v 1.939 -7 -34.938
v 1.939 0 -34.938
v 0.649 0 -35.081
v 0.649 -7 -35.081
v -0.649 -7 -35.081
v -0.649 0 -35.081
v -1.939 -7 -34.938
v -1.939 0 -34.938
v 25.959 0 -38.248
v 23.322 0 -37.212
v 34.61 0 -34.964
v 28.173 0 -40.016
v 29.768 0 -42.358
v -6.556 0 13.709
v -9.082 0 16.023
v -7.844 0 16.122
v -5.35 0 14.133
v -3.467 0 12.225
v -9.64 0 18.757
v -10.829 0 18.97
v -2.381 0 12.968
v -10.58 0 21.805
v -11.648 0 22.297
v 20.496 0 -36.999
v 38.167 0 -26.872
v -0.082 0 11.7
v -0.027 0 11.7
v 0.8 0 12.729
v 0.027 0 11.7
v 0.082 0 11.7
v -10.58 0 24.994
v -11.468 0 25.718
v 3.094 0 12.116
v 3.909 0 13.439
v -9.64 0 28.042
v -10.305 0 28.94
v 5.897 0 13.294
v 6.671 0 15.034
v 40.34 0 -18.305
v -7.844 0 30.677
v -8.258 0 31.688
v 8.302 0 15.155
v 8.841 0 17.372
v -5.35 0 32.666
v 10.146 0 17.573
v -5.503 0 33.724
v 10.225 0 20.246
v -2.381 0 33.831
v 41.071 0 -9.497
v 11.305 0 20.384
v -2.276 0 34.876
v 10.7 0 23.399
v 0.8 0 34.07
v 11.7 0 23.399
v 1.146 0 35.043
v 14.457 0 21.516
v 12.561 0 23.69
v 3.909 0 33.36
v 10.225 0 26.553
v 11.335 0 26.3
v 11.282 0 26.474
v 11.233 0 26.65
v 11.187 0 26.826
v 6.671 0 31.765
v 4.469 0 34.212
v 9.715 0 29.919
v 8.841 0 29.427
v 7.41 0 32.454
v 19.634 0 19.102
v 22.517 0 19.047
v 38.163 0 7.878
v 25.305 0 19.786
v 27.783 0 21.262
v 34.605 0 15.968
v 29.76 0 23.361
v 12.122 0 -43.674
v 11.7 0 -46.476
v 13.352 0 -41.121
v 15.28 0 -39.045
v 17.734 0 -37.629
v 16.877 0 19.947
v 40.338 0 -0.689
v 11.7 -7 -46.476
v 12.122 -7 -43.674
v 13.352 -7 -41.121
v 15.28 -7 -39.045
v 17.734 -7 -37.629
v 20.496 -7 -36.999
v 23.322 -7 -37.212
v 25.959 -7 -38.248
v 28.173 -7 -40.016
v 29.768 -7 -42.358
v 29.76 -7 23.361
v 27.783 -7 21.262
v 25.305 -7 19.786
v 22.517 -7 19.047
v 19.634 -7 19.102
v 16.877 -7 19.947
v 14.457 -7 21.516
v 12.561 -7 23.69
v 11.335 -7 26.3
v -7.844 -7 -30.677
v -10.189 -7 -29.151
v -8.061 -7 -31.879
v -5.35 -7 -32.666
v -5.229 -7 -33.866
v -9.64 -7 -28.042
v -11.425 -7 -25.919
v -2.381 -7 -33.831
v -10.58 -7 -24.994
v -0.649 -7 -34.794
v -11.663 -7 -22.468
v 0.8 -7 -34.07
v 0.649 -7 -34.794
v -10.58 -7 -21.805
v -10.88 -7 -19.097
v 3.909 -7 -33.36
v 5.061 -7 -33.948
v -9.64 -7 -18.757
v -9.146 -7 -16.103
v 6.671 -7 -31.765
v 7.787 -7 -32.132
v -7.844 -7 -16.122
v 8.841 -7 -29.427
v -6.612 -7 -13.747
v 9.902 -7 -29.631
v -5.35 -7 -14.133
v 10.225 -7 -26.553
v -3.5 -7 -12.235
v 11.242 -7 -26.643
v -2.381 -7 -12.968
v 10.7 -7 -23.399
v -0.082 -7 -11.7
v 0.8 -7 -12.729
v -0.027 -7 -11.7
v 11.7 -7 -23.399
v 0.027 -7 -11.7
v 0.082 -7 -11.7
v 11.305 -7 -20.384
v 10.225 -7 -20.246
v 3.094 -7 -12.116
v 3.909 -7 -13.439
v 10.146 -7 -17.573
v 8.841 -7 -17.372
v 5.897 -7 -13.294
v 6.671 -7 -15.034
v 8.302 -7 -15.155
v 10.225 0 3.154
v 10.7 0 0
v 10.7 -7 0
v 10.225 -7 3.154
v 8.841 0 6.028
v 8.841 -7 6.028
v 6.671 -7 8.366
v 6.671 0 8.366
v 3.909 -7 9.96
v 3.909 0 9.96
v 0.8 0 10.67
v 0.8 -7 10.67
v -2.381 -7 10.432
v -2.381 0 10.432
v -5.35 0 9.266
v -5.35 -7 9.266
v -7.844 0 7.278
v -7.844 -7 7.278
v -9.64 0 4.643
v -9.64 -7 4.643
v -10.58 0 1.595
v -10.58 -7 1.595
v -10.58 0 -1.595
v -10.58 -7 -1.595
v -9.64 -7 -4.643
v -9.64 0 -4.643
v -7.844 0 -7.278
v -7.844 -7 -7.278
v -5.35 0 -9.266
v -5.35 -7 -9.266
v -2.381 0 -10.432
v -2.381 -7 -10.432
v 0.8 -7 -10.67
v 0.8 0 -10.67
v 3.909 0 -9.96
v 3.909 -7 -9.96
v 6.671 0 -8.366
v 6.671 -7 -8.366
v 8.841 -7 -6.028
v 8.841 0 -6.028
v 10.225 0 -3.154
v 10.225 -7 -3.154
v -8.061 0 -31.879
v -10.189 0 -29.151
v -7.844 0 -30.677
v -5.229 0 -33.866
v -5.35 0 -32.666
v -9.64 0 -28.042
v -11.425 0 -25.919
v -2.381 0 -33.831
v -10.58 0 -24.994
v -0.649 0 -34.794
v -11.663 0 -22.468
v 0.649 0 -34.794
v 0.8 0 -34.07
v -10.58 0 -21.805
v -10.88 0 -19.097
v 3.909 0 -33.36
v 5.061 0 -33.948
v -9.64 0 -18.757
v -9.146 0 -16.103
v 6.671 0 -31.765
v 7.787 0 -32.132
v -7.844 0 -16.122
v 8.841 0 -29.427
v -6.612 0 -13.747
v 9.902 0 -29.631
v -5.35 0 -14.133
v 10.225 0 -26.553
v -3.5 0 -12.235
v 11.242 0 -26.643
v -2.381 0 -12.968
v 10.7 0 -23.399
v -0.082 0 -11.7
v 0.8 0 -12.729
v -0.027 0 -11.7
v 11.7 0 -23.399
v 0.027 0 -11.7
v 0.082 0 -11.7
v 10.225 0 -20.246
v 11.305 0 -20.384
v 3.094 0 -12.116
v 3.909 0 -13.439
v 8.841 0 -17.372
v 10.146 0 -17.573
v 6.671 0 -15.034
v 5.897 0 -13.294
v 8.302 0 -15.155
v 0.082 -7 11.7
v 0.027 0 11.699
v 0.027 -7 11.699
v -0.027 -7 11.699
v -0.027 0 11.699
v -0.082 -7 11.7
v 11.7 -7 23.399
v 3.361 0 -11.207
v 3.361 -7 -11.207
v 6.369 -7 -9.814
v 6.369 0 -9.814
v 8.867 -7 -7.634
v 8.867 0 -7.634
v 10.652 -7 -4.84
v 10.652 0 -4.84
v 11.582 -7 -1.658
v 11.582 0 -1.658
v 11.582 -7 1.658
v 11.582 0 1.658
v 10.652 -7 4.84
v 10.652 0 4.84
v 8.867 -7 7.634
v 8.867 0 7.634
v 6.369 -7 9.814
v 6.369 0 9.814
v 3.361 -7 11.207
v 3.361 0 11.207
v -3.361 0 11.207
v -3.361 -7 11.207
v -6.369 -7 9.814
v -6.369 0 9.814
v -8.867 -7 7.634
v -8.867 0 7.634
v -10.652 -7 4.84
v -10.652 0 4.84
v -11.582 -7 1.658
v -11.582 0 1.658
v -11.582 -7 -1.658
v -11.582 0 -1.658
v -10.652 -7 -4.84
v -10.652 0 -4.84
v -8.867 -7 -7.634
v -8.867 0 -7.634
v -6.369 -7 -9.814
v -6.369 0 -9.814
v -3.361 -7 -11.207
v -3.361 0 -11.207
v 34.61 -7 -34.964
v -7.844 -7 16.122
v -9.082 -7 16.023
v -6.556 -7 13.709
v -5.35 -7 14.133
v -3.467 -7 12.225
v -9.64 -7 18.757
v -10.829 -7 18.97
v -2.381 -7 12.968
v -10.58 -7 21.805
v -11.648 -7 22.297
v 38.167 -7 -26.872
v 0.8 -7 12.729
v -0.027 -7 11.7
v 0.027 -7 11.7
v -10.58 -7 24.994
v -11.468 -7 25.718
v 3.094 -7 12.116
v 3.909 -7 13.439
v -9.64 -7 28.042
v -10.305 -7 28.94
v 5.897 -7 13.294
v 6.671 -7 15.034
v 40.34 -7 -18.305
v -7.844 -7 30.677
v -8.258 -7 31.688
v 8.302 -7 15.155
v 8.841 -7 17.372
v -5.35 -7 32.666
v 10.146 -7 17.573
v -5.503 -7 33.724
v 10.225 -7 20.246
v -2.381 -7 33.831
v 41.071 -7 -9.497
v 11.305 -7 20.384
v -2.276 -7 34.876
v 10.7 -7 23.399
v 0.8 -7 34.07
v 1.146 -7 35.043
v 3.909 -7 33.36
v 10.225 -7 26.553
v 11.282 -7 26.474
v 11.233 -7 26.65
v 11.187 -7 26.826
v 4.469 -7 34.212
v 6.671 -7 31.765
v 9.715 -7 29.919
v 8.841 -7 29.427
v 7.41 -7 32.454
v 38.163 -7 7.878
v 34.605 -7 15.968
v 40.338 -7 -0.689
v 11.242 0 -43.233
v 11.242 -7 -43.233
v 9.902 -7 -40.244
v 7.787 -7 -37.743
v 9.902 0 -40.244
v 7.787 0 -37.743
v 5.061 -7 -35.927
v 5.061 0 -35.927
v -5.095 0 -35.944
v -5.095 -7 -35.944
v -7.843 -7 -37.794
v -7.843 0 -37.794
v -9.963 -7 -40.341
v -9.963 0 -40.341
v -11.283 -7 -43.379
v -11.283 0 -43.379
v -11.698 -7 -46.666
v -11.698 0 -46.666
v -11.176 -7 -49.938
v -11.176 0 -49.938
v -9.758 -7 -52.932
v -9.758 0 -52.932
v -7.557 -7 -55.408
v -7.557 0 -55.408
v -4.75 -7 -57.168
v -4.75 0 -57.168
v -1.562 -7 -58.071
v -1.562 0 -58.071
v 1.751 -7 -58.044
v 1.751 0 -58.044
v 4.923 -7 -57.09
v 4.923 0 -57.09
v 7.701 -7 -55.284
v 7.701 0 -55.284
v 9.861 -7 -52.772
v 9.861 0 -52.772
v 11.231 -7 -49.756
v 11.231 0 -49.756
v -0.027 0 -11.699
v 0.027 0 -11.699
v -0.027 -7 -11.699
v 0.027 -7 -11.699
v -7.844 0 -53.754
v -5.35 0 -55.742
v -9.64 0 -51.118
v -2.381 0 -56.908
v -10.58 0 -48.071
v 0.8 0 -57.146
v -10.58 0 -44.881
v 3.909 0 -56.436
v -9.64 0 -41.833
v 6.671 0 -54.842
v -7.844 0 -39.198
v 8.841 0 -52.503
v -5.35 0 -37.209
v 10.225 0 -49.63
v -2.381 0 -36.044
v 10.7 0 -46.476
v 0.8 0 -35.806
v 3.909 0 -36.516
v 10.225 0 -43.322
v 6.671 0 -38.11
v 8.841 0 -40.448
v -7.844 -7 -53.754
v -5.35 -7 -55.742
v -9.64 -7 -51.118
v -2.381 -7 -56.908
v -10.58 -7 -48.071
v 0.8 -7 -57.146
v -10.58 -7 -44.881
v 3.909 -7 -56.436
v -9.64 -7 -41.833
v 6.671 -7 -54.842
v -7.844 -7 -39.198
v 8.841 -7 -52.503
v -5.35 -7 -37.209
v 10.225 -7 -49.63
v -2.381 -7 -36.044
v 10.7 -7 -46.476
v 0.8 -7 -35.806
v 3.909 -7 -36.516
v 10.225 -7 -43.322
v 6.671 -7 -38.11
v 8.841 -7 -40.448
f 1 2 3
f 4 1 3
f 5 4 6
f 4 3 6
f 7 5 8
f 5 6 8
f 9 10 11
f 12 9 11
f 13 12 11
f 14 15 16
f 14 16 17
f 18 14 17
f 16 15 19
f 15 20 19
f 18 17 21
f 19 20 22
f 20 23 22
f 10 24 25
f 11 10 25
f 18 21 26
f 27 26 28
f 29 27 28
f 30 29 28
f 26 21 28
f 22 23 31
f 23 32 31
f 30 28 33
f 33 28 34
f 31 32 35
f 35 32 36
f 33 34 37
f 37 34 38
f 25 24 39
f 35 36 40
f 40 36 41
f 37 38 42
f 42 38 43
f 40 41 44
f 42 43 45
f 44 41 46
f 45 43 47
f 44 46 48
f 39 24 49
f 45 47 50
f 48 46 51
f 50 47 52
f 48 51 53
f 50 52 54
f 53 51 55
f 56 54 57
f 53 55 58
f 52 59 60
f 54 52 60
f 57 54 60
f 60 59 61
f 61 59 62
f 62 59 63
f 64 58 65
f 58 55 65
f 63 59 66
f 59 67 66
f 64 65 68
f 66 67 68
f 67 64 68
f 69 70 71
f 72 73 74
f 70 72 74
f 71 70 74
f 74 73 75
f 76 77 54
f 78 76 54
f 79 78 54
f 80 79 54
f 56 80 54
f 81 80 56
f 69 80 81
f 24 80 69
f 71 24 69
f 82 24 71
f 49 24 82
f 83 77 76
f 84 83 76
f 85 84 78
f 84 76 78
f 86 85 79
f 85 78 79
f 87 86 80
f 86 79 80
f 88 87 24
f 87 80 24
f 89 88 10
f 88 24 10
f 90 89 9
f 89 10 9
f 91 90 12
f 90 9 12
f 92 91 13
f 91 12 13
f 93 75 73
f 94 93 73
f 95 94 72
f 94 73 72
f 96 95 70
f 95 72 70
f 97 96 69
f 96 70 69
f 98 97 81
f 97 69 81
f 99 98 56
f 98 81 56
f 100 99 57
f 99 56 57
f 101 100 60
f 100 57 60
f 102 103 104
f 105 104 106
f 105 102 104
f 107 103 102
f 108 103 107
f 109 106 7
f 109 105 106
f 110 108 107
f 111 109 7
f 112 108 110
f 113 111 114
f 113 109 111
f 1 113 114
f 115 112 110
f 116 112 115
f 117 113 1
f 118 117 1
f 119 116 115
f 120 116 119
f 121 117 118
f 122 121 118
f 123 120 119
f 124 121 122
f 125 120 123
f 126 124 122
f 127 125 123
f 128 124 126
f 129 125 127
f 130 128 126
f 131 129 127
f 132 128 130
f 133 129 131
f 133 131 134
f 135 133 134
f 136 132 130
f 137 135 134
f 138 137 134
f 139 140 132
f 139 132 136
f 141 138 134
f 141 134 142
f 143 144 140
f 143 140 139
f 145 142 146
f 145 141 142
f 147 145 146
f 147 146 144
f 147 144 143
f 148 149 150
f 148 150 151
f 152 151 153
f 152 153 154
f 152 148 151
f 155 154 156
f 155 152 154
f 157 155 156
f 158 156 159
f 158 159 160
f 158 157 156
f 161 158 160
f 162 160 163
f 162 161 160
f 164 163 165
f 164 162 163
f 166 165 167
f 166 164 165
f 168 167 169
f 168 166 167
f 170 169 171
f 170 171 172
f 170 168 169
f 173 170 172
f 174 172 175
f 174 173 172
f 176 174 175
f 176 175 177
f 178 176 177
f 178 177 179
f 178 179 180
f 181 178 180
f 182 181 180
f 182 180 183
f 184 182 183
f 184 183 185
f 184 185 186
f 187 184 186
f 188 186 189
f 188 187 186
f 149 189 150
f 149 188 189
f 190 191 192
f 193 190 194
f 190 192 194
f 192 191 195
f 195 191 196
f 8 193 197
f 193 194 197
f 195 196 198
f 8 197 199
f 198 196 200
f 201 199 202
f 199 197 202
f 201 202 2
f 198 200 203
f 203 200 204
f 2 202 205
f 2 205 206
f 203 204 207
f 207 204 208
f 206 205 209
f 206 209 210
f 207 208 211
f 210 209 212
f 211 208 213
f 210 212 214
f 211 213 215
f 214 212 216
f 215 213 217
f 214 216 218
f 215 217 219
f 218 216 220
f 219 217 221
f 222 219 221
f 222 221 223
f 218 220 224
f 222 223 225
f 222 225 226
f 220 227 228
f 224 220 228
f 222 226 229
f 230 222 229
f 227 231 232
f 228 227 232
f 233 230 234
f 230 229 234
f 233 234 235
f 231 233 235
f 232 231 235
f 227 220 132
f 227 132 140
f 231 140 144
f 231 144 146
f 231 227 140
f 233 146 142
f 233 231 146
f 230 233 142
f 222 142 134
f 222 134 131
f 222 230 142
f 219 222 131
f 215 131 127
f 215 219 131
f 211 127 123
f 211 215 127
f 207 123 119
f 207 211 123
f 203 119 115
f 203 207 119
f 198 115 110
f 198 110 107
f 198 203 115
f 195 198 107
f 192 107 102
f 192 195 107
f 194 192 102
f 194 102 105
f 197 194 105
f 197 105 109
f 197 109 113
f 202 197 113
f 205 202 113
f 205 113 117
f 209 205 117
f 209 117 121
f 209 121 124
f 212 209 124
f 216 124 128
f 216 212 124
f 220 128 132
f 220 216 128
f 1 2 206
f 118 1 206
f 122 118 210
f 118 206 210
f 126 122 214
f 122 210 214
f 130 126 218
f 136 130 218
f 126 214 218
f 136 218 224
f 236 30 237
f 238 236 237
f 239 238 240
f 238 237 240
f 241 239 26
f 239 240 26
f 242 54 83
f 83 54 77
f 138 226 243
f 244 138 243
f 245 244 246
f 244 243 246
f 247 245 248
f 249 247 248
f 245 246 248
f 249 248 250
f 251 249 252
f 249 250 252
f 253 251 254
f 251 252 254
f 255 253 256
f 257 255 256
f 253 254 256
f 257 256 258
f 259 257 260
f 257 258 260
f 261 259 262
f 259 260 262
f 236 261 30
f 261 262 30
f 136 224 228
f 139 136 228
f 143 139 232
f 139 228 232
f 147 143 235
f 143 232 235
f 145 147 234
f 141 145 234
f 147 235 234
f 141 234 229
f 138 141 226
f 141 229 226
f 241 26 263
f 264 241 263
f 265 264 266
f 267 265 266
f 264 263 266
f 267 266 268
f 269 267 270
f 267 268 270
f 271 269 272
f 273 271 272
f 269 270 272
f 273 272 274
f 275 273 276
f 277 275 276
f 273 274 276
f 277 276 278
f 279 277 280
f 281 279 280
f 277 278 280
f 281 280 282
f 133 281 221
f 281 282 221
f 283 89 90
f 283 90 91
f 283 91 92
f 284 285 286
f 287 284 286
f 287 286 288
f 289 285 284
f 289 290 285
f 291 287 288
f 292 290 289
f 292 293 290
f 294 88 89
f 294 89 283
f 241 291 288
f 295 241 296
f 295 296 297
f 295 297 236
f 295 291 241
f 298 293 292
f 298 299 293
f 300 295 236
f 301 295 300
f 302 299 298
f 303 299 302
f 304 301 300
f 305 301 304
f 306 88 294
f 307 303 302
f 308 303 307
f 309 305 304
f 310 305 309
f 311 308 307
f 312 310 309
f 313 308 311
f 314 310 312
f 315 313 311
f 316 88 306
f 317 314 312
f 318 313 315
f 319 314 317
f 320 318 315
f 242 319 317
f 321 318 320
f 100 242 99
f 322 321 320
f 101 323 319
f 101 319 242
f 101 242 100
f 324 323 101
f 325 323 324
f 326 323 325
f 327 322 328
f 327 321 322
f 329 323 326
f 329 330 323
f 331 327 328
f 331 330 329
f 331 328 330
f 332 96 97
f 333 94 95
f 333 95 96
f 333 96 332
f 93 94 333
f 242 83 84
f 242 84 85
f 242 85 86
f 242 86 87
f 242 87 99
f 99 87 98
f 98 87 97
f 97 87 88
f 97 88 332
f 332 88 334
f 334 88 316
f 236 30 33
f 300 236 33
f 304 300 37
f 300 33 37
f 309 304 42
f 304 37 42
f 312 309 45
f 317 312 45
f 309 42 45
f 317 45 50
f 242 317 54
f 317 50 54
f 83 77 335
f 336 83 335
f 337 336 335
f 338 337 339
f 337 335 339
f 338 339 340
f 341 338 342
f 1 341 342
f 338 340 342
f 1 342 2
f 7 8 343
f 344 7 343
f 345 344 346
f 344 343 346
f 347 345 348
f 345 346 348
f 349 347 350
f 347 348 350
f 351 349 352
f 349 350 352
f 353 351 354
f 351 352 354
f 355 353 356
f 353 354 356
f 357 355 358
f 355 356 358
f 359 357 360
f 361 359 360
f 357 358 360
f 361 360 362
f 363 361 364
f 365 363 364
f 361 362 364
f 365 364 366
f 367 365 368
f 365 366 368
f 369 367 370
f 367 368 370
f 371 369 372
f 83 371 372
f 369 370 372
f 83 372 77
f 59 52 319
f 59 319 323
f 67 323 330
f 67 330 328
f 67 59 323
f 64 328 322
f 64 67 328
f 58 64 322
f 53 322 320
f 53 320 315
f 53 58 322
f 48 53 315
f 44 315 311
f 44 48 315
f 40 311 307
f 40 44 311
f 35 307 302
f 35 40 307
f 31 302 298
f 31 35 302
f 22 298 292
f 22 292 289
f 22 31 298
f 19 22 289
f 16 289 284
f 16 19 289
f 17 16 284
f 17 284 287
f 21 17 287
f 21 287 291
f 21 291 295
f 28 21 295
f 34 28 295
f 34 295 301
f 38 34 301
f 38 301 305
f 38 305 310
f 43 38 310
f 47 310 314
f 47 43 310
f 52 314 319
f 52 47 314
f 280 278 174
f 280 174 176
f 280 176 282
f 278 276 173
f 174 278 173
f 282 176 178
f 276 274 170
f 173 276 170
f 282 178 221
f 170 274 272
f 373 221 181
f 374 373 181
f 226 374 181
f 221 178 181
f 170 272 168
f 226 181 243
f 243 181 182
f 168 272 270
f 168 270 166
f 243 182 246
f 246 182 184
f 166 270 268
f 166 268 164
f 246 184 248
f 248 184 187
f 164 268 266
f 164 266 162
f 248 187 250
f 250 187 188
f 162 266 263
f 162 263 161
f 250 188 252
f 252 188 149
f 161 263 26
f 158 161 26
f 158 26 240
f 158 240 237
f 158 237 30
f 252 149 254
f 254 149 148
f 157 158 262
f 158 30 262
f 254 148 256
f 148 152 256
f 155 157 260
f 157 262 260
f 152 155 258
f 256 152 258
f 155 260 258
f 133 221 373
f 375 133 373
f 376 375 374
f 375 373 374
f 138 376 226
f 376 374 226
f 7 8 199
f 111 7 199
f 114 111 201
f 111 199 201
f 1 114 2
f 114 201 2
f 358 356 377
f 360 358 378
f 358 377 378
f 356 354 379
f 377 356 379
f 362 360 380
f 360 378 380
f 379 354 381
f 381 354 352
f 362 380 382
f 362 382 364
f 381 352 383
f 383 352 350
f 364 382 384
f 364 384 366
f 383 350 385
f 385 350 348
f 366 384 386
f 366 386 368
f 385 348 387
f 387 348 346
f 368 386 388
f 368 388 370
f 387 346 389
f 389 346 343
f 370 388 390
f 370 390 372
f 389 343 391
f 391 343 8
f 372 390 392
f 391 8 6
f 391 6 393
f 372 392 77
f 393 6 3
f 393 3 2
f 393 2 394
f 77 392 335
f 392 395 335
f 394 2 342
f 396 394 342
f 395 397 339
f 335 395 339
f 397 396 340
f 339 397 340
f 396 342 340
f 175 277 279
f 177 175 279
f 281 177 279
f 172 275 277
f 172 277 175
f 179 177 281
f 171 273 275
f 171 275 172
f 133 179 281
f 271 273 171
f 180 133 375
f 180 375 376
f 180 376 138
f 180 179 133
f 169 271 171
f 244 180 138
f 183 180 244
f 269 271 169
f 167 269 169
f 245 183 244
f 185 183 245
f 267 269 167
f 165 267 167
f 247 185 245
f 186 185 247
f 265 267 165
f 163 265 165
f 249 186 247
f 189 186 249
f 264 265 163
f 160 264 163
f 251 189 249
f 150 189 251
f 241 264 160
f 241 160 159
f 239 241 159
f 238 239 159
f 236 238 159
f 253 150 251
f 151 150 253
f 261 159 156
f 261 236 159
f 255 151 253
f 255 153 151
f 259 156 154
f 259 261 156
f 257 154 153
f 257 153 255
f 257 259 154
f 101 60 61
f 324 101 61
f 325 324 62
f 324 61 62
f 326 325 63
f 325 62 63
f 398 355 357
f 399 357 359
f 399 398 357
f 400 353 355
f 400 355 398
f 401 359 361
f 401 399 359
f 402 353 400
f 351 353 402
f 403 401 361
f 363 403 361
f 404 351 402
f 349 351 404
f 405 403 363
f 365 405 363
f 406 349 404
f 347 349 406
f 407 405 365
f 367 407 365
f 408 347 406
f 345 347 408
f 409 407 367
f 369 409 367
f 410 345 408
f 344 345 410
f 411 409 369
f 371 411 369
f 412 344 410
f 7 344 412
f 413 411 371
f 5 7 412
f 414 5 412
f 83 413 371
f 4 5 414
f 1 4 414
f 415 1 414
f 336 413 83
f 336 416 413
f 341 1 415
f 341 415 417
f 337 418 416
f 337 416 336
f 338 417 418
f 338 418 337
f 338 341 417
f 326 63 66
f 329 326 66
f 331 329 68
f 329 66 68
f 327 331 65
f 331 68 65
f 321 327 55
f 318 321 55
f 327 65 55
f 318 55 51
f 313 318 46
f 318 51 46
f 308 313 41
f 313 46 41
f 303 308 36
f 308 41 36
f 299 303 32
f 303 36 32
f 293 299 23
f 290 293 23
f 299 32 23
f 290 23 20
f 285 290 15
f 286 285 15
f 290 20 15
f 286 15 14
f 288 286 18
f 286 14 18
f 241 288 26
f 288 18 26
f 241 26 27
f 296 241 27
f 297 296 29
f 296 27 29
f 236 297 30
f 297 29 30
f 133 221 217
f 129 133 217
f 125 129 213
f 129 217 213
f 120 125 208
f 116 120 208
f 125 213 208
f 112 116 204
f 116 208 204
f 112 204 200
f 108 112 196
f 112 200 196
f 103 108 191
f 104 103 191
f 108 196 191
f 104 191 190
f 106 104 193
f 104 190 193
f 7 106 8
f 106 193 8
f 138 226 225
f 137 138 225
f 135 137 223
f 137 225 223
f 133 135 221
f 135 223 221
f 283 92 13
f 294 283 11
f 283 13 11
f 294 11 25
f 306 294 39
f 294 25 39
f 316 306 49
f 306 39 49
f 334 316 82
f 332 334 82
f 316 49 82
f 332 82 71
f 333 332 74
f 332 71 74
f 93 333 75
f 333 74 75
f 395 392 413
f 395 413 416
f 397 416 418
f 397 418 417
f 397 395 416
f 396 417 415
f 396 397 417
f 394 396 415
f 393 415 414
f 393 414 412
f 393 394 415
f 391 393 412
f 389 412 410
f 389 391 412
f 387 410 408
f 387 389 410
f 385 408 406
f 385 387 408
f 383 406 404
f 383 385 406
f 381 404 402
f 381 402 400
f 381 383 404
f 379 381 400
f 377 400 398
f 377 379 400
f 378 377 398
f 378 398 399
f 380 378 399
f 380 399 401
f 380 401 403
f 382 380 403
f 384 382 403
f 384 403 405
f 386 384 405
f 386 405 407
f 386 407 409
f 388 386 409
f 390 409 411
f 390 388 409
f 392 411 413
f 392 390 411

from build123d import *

# Parameters (mm, degrees)
F0_R     = 10.7
F1_DEPTH = 7


with BuildPart() as f1:
    # F0 (on Front) → F1 (new body)
    with BuildSketch(Plane.XZ):
        with BuildLine():
            ThreePointArc((-0.0819729994, 11.6997128353), (0, 11.7), (0.0819729994, 11.6997128353))
            ThreePointArc((0.0819729994, 11.6997128353), (8.3020805854, 15.1553091045), (11.7, 23.3994256705))
            ThreePointArc((11.7, 23.3994256705), (11.6083373103, 24.8611044625), (11.3347854887, 26.2998804495))
            ThreePointArc((11.3347854887, 26.2998804495), (11.2574671046, 26.5618552508), (11.1870535149, 26.8257697359))
            ThreePointArc((11.1870535149, 26.8257697359), (-9.3824358593, 30.3894111745), (-0.0819729994, 11.6997128353))
        make_face()
        with Locations((0, 23.3994256705)):
            Circle(F0_R, mode=Mode.SUBTRACT)
        with BuildLine():
            Line((11.7, 23.3994256705), (11.7, 0))
            Line((11.7, 0), (11.7, -23.3994256705))
            Line((11.7, -23.3994256705), (11.7, -46.4759171009))
            ThreePointArc((11.7, -46.4759171009), (19.0913360222, -37.2102467747), (29.7679230211, -42.3575747068))
            ThreePointArc((29.7679230211, -42.3575747068), (41.0708012444, -9.4969864297), (29.7604638503, 23.3610352102))
            ThreePointArc((29.7604638503, 23.3610352102), (19.634015707, 19.1024036043), (11.3347854887, 26.2998804495))
            ThreePointArc((11.3347854887, 26.2998804495), (11.6083373103, 24.8611044625), (11.7, 23.3994256705))
        make_face()
    extrude(amount=F1_DEPTH)


with BuildPart() as f1b:
    # F0 (on Front) → F1, piece 2 (new body)
    with BuildSketch(Plane.XZ):
        with BuildLine():
            ThreePointArc((0.0819729994, -11.6997128353), (8.3020805854, -8.244116566), (11.7, 0))
            ThreePointArc((11.7, 0), (8.3020805854, 8.244116566), (0.0819729994, 11.6997128353))
            ThreePointArc((0.0819729994, 11.6997128353), (0, 11.6994256705), (-0.0819729994, 11.6997128353))
            ThreePointArc((-0.0819729994, 11.6997128353), (-11.7, 0), (-0.0819729994, -11.6997128353))
            ThreePointArc((-0.0819729994, -11.6997128353), (0, -11.6994256705), (0.0819729994, -11.6997128353))
        make_face()
        Circle(F0_R, mode=Mode.SUBTRACT)
    extrude(amount=F1_DEPTH)


with BuildPart() as f1c:
    # F0 (on Front) → F1, piece 3 (new body)
    with BuildSketch(Plane.XZ):
        with BuildLine():
            ThreePointArc((11.7, -23.3994256705), (8.3020805854, -15.1553091045), (0.0819729994, -11.6997128353))
            ThreePointArc((0.0819729994, -11.6997128353), (0, -11.7), (-0.0819729994, -11.6997128353))
            ThreePointArc((-0.0819729994, -11.6997128353), (-11.6628274762, -22.467516201), (-1.9387846233, -34.9376713857))
            ThreePointArc((-1.9387846233, -34.9376713857), (0, -34.7759171009), (1.9387846233, -34.9376713857))
            ThreePointArc((1.9387846233, -34.9376713857), (8.932350757, -30.9560856439), (11.7, -23.3994256705))
        make_face()
        with Locations((0, -23.3994256705)):
            Circle(F0_R, mode=Mode.SUBTRACT)
    extrude(amount=F1_DEPTH)


with BuildPart() as f1d:
    # F0 (on Front) → F1, piece 4 (new body)
    with BuildSketch(Plane.XZ):
        with BuildLine():
            ThreePointArc((11.7, -46.4759171009), (8.932350757, -38.9192571275), (1.9387846233, -34.9376713857))
            ThreePointArc((1.9387846233, -34.9376713857), (0, -35.0994256705), (-1.9387846233, -34.9376713857))
            ThreePointArc((-1.9387846233, -34.9376713857), (-7.5566599734, -55.4082678579), (11.7, -46.4759171009))
        make_face()
        with Locations((0, -46.4759171009)):
            Circle(F0_R, mode=Mode.SUBTRACT)
    extrude(amount=F1_DEPTH)


solid = Compound([f1.part, f1b.part, f1c.part, f1d.part])
